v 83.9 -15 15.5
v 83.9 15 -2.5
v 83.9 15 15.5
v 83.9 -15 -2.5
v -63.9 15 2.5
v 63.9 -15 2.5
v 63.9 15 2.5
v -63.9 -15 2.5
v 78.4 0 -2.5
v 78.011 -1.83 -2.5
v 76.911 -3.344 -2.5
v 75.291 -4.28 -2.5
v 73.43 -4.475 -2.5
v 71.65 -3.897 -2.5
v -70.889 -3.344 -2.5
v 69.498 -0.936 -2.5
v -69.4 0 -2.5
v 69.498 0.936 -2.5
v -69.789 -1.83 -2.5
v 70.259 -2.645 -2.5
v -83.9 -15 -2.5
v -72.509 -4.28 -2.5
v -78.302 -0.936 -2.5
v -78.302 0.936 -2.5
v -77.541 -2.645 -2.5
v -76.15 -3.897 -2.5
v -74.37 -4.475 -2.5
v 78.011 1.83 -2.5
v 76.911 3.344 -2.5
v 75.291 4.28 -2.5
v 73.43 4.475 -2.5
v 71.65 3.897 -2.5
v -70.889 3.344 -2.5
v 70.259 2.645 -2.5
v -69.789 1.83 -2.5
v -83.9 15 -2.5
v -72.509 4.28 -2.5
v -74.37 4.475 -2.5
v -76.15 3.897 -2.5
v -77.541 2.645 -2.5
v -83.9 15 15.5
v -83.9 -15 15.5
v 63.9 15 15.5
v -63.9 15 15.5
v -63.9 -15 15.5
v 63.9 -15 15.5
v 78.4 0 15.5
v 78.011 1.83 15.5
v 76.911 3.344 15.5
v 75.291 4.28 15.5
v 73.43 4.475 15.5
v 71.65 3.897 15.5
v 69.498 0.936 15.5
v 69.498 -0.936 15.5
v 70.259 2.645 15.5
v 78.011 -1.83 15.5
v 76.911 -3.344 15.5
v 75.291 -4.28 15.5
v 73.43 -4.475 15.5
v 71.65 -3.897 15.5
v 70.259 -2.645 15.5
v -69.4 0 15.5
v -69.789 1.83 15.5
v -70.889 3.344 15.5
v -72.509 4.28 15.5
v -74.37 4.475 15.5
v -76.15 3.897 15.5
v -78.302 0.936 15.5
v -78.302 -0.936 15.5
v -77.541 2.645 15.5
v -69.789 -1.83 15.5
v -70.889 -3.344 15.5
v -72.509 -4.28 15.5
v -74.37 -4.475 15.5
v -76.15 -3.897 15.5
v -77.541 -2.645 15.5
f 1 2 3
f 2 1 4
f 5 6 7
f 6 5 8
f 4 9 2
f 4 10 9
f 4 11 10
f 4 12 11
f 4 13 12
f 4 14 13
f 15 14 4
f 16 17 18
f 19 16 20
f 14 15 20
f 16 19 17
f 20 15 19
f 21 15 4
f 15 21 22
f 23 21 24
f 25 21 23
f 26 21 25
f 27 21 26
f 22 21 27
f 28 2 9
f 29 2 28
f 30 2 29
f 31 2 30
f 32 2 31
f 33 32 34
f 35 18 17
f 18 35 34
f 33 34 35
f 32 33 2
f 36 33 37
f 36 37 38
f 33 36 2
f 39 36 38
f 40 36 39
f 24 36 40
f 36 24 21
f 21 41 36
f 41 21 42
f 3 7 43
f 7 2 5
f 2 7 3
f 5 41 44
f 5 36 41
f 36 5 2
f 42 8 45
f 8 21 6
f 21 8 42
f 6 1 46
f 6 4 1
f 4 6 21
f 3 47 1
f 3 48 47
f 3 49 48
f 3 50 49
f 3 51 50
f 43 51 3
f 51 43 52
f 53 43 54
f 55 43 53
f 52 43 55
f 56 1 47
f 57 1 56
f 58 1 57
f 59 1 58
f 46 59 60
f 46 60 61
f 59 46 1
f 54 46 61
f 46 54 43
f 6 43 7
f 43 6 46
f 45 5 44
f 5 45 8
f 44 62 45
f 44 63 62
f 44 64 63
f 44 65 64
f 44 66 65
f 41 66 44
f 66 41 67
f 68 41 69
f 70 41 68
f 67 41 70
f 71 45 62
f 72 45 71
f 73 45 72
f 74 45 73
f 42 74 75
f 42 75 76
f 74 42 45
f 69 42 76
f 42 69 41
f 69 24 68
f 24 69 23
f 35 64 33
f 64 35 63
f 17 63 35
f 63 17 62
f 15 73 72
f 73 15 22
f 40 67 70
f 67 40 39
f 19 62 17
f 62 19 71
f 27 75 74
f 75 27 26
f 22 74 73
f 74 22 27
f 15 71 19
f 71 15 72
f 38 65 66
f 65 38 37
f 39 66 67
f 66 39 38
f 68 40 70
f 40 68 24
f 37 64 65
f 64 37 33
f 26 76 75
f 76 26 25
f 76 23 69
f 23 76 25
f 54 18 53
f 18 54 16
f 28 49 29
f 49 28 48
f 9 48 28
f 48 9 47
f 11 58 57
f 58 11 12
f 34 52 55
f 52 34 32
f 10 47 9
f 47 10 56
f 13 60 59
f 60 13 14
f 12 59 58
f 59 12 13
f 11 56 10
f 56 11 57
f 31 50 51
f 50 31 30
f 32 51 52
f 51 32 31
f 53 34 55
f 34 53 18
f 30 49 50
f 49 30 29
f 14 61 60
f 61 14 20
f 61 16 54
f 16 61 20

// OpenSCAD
// file: utils/build_plate.scad
// Build Plate representation module
// Made by Makerbot (http://curriculum.makerbot.com/daily_lessons/february/openscad_buildplate.html)

//use this to include a build plate visualization in your openSCAD scripts. Very useful for things designed to be edited in Makerbot Customizer

//to use, either include or use <utils/build_plate.scad>

//then just call build_plate(); with the following arguments (also, you have to have a real object in your scene for this to render)

//putting 0 as the first argument will give you a Replicator 2 build plate
//putting 1 as the first argument will give you a Replicator 1 build plate
//putting 2 as the first argument will give you a Thingomatic build plate
//putting 3 as the first argument will give you a manually adjustable build plate (note: if you use this option, you need to specify your build plates X length (in mm) as the second argument and the Y length (in mm) as the third argument. eg. build_plate(3,150,120);)

/*

to give your user control of which build plate they see in Customizer, include the following code:

use <utils/build_plate.scad>

//for display only, doesn't contribute to final object
build_plate_selector = 0; //[0:Replicator 2,1: Replicator,2:Thingomatic,3:Manual]
//when Build Plate Selector is set to "manual" this controls the build plate x dimension
build_plate_manual_x = 100; //[100:400]
//when Build Plate Selector is set to "manual" this controls the build plate y dimension
build_plate_manual_y = 100; //[100:400]

build_plate(build_plate_selector,build_plate_manual_x,build_plate_manual_y);

*/




//to see how this works, uncomment the following code

//build_plate_selector = 0; //[0:Replicator 2,1: Replicator,2:Thingomatic,3:Manual]
//build_plate_manual_x = 100; //[100:400]
//build_plate_manual_y = 100; //[100:400]
//
//build_plate(build_plate_selector,build_plate_manual_x,build_plate_manual_y);
//
//cube(5);


module build_plate(bp,manX,manY){

		translate([0,0,-.52]){
			if(bp == 0){
				%cube([285,153,1],center = true);
			}
			if(bp == 1){
				%cube([225,145,1],center = true);
			}
			if(bp == 2){
				%cube([120,120,1],center = true);
			}
			if(bp == 3){
				%cube([manX,manY,1],center = true);
			}
		
		}
		translate([0,0,-.5]){
			if(bp == 0){
				for(i = [-14:14]){
					translate([i*10,0,0])
					%cube([.5,153,1.01],center = true);
				}
				for(i = [-7:7]){
					translate([0,i*10,0])
					%cube([285,.5,1.01],center = true);
				}	
			}
			if(bp == 1){
				for(i = [-11:11]){
					translate([i*10,0,0])
						%cube([.5,145,1.01],center = true);
				}
				for(i = [-7:7]){
					translate([0,i*10,0])
						%cube([225,.5,1.01],center = true);
				}
			}
			if(bp == 2){
				for(i = [-6:6]){
					translate([i*10,0,0])
						%cube([.5,120,1.01],center = true);
				}
				for(i = [-6:6]){
					translate([0,i*10,0])
						%cube([120,.5,1.01],center = true);
				}
			}
			if(bp == 3){
				for(i = [-(floor(manX/20)):floor(manX/20)]){
					translate([i*10,0,0])
						%cube([.5,manY,1.01],center = true);
				}
				for(i = [-(floor(manY/20)):floor(manY/20)]){
					translate([0,i*10,0])
						%cube([manX,.5,1.01],center = true);
				}
			}
		}
}
// main file
use <./utils/build_plate.scad> // Cuadricula transparente para la base
build_plate(3, 200,100); // No se incluye al renderizar


//----------------------------------------------------------
//-- Tutorial OpenScad
//-- Juan Gonzalez-Gomez (Obijuan) juan@iearobotics.com
//----------------------------------------------------------
//-- (c) Mayo, 2012
//-- Licencia GPL
//----------------------------------------------------------
//-- Ejemplo de modificadores para usarlo en la depuracion
//----------------------------------------------------------

difference() {

  //-- Pieza sin taladros
  union() {
    //-- Cuerpo
    color("blue")
    cube([167.8, 30, 5],center=true);

    //-- Torre derecha
    color("green")
    translate([167.8/2-20/2,0,13/2+5/2])
       cube([20,30,13],center=true);

    //-- Torre izquierda
    color("yellow")
    translate([-167.8/2+20/2,0,13/2+5/2])
      cube([20,30,13],center=true);
  }

  //-- Taladros
  #translate([-167.8/2+10,0,0])
    cylinder(r=9/2, h=50, center=true);

  #translate([+167.8/2-10,0,0])
    cylinder(r=9/2, h=50, center=true);
}
